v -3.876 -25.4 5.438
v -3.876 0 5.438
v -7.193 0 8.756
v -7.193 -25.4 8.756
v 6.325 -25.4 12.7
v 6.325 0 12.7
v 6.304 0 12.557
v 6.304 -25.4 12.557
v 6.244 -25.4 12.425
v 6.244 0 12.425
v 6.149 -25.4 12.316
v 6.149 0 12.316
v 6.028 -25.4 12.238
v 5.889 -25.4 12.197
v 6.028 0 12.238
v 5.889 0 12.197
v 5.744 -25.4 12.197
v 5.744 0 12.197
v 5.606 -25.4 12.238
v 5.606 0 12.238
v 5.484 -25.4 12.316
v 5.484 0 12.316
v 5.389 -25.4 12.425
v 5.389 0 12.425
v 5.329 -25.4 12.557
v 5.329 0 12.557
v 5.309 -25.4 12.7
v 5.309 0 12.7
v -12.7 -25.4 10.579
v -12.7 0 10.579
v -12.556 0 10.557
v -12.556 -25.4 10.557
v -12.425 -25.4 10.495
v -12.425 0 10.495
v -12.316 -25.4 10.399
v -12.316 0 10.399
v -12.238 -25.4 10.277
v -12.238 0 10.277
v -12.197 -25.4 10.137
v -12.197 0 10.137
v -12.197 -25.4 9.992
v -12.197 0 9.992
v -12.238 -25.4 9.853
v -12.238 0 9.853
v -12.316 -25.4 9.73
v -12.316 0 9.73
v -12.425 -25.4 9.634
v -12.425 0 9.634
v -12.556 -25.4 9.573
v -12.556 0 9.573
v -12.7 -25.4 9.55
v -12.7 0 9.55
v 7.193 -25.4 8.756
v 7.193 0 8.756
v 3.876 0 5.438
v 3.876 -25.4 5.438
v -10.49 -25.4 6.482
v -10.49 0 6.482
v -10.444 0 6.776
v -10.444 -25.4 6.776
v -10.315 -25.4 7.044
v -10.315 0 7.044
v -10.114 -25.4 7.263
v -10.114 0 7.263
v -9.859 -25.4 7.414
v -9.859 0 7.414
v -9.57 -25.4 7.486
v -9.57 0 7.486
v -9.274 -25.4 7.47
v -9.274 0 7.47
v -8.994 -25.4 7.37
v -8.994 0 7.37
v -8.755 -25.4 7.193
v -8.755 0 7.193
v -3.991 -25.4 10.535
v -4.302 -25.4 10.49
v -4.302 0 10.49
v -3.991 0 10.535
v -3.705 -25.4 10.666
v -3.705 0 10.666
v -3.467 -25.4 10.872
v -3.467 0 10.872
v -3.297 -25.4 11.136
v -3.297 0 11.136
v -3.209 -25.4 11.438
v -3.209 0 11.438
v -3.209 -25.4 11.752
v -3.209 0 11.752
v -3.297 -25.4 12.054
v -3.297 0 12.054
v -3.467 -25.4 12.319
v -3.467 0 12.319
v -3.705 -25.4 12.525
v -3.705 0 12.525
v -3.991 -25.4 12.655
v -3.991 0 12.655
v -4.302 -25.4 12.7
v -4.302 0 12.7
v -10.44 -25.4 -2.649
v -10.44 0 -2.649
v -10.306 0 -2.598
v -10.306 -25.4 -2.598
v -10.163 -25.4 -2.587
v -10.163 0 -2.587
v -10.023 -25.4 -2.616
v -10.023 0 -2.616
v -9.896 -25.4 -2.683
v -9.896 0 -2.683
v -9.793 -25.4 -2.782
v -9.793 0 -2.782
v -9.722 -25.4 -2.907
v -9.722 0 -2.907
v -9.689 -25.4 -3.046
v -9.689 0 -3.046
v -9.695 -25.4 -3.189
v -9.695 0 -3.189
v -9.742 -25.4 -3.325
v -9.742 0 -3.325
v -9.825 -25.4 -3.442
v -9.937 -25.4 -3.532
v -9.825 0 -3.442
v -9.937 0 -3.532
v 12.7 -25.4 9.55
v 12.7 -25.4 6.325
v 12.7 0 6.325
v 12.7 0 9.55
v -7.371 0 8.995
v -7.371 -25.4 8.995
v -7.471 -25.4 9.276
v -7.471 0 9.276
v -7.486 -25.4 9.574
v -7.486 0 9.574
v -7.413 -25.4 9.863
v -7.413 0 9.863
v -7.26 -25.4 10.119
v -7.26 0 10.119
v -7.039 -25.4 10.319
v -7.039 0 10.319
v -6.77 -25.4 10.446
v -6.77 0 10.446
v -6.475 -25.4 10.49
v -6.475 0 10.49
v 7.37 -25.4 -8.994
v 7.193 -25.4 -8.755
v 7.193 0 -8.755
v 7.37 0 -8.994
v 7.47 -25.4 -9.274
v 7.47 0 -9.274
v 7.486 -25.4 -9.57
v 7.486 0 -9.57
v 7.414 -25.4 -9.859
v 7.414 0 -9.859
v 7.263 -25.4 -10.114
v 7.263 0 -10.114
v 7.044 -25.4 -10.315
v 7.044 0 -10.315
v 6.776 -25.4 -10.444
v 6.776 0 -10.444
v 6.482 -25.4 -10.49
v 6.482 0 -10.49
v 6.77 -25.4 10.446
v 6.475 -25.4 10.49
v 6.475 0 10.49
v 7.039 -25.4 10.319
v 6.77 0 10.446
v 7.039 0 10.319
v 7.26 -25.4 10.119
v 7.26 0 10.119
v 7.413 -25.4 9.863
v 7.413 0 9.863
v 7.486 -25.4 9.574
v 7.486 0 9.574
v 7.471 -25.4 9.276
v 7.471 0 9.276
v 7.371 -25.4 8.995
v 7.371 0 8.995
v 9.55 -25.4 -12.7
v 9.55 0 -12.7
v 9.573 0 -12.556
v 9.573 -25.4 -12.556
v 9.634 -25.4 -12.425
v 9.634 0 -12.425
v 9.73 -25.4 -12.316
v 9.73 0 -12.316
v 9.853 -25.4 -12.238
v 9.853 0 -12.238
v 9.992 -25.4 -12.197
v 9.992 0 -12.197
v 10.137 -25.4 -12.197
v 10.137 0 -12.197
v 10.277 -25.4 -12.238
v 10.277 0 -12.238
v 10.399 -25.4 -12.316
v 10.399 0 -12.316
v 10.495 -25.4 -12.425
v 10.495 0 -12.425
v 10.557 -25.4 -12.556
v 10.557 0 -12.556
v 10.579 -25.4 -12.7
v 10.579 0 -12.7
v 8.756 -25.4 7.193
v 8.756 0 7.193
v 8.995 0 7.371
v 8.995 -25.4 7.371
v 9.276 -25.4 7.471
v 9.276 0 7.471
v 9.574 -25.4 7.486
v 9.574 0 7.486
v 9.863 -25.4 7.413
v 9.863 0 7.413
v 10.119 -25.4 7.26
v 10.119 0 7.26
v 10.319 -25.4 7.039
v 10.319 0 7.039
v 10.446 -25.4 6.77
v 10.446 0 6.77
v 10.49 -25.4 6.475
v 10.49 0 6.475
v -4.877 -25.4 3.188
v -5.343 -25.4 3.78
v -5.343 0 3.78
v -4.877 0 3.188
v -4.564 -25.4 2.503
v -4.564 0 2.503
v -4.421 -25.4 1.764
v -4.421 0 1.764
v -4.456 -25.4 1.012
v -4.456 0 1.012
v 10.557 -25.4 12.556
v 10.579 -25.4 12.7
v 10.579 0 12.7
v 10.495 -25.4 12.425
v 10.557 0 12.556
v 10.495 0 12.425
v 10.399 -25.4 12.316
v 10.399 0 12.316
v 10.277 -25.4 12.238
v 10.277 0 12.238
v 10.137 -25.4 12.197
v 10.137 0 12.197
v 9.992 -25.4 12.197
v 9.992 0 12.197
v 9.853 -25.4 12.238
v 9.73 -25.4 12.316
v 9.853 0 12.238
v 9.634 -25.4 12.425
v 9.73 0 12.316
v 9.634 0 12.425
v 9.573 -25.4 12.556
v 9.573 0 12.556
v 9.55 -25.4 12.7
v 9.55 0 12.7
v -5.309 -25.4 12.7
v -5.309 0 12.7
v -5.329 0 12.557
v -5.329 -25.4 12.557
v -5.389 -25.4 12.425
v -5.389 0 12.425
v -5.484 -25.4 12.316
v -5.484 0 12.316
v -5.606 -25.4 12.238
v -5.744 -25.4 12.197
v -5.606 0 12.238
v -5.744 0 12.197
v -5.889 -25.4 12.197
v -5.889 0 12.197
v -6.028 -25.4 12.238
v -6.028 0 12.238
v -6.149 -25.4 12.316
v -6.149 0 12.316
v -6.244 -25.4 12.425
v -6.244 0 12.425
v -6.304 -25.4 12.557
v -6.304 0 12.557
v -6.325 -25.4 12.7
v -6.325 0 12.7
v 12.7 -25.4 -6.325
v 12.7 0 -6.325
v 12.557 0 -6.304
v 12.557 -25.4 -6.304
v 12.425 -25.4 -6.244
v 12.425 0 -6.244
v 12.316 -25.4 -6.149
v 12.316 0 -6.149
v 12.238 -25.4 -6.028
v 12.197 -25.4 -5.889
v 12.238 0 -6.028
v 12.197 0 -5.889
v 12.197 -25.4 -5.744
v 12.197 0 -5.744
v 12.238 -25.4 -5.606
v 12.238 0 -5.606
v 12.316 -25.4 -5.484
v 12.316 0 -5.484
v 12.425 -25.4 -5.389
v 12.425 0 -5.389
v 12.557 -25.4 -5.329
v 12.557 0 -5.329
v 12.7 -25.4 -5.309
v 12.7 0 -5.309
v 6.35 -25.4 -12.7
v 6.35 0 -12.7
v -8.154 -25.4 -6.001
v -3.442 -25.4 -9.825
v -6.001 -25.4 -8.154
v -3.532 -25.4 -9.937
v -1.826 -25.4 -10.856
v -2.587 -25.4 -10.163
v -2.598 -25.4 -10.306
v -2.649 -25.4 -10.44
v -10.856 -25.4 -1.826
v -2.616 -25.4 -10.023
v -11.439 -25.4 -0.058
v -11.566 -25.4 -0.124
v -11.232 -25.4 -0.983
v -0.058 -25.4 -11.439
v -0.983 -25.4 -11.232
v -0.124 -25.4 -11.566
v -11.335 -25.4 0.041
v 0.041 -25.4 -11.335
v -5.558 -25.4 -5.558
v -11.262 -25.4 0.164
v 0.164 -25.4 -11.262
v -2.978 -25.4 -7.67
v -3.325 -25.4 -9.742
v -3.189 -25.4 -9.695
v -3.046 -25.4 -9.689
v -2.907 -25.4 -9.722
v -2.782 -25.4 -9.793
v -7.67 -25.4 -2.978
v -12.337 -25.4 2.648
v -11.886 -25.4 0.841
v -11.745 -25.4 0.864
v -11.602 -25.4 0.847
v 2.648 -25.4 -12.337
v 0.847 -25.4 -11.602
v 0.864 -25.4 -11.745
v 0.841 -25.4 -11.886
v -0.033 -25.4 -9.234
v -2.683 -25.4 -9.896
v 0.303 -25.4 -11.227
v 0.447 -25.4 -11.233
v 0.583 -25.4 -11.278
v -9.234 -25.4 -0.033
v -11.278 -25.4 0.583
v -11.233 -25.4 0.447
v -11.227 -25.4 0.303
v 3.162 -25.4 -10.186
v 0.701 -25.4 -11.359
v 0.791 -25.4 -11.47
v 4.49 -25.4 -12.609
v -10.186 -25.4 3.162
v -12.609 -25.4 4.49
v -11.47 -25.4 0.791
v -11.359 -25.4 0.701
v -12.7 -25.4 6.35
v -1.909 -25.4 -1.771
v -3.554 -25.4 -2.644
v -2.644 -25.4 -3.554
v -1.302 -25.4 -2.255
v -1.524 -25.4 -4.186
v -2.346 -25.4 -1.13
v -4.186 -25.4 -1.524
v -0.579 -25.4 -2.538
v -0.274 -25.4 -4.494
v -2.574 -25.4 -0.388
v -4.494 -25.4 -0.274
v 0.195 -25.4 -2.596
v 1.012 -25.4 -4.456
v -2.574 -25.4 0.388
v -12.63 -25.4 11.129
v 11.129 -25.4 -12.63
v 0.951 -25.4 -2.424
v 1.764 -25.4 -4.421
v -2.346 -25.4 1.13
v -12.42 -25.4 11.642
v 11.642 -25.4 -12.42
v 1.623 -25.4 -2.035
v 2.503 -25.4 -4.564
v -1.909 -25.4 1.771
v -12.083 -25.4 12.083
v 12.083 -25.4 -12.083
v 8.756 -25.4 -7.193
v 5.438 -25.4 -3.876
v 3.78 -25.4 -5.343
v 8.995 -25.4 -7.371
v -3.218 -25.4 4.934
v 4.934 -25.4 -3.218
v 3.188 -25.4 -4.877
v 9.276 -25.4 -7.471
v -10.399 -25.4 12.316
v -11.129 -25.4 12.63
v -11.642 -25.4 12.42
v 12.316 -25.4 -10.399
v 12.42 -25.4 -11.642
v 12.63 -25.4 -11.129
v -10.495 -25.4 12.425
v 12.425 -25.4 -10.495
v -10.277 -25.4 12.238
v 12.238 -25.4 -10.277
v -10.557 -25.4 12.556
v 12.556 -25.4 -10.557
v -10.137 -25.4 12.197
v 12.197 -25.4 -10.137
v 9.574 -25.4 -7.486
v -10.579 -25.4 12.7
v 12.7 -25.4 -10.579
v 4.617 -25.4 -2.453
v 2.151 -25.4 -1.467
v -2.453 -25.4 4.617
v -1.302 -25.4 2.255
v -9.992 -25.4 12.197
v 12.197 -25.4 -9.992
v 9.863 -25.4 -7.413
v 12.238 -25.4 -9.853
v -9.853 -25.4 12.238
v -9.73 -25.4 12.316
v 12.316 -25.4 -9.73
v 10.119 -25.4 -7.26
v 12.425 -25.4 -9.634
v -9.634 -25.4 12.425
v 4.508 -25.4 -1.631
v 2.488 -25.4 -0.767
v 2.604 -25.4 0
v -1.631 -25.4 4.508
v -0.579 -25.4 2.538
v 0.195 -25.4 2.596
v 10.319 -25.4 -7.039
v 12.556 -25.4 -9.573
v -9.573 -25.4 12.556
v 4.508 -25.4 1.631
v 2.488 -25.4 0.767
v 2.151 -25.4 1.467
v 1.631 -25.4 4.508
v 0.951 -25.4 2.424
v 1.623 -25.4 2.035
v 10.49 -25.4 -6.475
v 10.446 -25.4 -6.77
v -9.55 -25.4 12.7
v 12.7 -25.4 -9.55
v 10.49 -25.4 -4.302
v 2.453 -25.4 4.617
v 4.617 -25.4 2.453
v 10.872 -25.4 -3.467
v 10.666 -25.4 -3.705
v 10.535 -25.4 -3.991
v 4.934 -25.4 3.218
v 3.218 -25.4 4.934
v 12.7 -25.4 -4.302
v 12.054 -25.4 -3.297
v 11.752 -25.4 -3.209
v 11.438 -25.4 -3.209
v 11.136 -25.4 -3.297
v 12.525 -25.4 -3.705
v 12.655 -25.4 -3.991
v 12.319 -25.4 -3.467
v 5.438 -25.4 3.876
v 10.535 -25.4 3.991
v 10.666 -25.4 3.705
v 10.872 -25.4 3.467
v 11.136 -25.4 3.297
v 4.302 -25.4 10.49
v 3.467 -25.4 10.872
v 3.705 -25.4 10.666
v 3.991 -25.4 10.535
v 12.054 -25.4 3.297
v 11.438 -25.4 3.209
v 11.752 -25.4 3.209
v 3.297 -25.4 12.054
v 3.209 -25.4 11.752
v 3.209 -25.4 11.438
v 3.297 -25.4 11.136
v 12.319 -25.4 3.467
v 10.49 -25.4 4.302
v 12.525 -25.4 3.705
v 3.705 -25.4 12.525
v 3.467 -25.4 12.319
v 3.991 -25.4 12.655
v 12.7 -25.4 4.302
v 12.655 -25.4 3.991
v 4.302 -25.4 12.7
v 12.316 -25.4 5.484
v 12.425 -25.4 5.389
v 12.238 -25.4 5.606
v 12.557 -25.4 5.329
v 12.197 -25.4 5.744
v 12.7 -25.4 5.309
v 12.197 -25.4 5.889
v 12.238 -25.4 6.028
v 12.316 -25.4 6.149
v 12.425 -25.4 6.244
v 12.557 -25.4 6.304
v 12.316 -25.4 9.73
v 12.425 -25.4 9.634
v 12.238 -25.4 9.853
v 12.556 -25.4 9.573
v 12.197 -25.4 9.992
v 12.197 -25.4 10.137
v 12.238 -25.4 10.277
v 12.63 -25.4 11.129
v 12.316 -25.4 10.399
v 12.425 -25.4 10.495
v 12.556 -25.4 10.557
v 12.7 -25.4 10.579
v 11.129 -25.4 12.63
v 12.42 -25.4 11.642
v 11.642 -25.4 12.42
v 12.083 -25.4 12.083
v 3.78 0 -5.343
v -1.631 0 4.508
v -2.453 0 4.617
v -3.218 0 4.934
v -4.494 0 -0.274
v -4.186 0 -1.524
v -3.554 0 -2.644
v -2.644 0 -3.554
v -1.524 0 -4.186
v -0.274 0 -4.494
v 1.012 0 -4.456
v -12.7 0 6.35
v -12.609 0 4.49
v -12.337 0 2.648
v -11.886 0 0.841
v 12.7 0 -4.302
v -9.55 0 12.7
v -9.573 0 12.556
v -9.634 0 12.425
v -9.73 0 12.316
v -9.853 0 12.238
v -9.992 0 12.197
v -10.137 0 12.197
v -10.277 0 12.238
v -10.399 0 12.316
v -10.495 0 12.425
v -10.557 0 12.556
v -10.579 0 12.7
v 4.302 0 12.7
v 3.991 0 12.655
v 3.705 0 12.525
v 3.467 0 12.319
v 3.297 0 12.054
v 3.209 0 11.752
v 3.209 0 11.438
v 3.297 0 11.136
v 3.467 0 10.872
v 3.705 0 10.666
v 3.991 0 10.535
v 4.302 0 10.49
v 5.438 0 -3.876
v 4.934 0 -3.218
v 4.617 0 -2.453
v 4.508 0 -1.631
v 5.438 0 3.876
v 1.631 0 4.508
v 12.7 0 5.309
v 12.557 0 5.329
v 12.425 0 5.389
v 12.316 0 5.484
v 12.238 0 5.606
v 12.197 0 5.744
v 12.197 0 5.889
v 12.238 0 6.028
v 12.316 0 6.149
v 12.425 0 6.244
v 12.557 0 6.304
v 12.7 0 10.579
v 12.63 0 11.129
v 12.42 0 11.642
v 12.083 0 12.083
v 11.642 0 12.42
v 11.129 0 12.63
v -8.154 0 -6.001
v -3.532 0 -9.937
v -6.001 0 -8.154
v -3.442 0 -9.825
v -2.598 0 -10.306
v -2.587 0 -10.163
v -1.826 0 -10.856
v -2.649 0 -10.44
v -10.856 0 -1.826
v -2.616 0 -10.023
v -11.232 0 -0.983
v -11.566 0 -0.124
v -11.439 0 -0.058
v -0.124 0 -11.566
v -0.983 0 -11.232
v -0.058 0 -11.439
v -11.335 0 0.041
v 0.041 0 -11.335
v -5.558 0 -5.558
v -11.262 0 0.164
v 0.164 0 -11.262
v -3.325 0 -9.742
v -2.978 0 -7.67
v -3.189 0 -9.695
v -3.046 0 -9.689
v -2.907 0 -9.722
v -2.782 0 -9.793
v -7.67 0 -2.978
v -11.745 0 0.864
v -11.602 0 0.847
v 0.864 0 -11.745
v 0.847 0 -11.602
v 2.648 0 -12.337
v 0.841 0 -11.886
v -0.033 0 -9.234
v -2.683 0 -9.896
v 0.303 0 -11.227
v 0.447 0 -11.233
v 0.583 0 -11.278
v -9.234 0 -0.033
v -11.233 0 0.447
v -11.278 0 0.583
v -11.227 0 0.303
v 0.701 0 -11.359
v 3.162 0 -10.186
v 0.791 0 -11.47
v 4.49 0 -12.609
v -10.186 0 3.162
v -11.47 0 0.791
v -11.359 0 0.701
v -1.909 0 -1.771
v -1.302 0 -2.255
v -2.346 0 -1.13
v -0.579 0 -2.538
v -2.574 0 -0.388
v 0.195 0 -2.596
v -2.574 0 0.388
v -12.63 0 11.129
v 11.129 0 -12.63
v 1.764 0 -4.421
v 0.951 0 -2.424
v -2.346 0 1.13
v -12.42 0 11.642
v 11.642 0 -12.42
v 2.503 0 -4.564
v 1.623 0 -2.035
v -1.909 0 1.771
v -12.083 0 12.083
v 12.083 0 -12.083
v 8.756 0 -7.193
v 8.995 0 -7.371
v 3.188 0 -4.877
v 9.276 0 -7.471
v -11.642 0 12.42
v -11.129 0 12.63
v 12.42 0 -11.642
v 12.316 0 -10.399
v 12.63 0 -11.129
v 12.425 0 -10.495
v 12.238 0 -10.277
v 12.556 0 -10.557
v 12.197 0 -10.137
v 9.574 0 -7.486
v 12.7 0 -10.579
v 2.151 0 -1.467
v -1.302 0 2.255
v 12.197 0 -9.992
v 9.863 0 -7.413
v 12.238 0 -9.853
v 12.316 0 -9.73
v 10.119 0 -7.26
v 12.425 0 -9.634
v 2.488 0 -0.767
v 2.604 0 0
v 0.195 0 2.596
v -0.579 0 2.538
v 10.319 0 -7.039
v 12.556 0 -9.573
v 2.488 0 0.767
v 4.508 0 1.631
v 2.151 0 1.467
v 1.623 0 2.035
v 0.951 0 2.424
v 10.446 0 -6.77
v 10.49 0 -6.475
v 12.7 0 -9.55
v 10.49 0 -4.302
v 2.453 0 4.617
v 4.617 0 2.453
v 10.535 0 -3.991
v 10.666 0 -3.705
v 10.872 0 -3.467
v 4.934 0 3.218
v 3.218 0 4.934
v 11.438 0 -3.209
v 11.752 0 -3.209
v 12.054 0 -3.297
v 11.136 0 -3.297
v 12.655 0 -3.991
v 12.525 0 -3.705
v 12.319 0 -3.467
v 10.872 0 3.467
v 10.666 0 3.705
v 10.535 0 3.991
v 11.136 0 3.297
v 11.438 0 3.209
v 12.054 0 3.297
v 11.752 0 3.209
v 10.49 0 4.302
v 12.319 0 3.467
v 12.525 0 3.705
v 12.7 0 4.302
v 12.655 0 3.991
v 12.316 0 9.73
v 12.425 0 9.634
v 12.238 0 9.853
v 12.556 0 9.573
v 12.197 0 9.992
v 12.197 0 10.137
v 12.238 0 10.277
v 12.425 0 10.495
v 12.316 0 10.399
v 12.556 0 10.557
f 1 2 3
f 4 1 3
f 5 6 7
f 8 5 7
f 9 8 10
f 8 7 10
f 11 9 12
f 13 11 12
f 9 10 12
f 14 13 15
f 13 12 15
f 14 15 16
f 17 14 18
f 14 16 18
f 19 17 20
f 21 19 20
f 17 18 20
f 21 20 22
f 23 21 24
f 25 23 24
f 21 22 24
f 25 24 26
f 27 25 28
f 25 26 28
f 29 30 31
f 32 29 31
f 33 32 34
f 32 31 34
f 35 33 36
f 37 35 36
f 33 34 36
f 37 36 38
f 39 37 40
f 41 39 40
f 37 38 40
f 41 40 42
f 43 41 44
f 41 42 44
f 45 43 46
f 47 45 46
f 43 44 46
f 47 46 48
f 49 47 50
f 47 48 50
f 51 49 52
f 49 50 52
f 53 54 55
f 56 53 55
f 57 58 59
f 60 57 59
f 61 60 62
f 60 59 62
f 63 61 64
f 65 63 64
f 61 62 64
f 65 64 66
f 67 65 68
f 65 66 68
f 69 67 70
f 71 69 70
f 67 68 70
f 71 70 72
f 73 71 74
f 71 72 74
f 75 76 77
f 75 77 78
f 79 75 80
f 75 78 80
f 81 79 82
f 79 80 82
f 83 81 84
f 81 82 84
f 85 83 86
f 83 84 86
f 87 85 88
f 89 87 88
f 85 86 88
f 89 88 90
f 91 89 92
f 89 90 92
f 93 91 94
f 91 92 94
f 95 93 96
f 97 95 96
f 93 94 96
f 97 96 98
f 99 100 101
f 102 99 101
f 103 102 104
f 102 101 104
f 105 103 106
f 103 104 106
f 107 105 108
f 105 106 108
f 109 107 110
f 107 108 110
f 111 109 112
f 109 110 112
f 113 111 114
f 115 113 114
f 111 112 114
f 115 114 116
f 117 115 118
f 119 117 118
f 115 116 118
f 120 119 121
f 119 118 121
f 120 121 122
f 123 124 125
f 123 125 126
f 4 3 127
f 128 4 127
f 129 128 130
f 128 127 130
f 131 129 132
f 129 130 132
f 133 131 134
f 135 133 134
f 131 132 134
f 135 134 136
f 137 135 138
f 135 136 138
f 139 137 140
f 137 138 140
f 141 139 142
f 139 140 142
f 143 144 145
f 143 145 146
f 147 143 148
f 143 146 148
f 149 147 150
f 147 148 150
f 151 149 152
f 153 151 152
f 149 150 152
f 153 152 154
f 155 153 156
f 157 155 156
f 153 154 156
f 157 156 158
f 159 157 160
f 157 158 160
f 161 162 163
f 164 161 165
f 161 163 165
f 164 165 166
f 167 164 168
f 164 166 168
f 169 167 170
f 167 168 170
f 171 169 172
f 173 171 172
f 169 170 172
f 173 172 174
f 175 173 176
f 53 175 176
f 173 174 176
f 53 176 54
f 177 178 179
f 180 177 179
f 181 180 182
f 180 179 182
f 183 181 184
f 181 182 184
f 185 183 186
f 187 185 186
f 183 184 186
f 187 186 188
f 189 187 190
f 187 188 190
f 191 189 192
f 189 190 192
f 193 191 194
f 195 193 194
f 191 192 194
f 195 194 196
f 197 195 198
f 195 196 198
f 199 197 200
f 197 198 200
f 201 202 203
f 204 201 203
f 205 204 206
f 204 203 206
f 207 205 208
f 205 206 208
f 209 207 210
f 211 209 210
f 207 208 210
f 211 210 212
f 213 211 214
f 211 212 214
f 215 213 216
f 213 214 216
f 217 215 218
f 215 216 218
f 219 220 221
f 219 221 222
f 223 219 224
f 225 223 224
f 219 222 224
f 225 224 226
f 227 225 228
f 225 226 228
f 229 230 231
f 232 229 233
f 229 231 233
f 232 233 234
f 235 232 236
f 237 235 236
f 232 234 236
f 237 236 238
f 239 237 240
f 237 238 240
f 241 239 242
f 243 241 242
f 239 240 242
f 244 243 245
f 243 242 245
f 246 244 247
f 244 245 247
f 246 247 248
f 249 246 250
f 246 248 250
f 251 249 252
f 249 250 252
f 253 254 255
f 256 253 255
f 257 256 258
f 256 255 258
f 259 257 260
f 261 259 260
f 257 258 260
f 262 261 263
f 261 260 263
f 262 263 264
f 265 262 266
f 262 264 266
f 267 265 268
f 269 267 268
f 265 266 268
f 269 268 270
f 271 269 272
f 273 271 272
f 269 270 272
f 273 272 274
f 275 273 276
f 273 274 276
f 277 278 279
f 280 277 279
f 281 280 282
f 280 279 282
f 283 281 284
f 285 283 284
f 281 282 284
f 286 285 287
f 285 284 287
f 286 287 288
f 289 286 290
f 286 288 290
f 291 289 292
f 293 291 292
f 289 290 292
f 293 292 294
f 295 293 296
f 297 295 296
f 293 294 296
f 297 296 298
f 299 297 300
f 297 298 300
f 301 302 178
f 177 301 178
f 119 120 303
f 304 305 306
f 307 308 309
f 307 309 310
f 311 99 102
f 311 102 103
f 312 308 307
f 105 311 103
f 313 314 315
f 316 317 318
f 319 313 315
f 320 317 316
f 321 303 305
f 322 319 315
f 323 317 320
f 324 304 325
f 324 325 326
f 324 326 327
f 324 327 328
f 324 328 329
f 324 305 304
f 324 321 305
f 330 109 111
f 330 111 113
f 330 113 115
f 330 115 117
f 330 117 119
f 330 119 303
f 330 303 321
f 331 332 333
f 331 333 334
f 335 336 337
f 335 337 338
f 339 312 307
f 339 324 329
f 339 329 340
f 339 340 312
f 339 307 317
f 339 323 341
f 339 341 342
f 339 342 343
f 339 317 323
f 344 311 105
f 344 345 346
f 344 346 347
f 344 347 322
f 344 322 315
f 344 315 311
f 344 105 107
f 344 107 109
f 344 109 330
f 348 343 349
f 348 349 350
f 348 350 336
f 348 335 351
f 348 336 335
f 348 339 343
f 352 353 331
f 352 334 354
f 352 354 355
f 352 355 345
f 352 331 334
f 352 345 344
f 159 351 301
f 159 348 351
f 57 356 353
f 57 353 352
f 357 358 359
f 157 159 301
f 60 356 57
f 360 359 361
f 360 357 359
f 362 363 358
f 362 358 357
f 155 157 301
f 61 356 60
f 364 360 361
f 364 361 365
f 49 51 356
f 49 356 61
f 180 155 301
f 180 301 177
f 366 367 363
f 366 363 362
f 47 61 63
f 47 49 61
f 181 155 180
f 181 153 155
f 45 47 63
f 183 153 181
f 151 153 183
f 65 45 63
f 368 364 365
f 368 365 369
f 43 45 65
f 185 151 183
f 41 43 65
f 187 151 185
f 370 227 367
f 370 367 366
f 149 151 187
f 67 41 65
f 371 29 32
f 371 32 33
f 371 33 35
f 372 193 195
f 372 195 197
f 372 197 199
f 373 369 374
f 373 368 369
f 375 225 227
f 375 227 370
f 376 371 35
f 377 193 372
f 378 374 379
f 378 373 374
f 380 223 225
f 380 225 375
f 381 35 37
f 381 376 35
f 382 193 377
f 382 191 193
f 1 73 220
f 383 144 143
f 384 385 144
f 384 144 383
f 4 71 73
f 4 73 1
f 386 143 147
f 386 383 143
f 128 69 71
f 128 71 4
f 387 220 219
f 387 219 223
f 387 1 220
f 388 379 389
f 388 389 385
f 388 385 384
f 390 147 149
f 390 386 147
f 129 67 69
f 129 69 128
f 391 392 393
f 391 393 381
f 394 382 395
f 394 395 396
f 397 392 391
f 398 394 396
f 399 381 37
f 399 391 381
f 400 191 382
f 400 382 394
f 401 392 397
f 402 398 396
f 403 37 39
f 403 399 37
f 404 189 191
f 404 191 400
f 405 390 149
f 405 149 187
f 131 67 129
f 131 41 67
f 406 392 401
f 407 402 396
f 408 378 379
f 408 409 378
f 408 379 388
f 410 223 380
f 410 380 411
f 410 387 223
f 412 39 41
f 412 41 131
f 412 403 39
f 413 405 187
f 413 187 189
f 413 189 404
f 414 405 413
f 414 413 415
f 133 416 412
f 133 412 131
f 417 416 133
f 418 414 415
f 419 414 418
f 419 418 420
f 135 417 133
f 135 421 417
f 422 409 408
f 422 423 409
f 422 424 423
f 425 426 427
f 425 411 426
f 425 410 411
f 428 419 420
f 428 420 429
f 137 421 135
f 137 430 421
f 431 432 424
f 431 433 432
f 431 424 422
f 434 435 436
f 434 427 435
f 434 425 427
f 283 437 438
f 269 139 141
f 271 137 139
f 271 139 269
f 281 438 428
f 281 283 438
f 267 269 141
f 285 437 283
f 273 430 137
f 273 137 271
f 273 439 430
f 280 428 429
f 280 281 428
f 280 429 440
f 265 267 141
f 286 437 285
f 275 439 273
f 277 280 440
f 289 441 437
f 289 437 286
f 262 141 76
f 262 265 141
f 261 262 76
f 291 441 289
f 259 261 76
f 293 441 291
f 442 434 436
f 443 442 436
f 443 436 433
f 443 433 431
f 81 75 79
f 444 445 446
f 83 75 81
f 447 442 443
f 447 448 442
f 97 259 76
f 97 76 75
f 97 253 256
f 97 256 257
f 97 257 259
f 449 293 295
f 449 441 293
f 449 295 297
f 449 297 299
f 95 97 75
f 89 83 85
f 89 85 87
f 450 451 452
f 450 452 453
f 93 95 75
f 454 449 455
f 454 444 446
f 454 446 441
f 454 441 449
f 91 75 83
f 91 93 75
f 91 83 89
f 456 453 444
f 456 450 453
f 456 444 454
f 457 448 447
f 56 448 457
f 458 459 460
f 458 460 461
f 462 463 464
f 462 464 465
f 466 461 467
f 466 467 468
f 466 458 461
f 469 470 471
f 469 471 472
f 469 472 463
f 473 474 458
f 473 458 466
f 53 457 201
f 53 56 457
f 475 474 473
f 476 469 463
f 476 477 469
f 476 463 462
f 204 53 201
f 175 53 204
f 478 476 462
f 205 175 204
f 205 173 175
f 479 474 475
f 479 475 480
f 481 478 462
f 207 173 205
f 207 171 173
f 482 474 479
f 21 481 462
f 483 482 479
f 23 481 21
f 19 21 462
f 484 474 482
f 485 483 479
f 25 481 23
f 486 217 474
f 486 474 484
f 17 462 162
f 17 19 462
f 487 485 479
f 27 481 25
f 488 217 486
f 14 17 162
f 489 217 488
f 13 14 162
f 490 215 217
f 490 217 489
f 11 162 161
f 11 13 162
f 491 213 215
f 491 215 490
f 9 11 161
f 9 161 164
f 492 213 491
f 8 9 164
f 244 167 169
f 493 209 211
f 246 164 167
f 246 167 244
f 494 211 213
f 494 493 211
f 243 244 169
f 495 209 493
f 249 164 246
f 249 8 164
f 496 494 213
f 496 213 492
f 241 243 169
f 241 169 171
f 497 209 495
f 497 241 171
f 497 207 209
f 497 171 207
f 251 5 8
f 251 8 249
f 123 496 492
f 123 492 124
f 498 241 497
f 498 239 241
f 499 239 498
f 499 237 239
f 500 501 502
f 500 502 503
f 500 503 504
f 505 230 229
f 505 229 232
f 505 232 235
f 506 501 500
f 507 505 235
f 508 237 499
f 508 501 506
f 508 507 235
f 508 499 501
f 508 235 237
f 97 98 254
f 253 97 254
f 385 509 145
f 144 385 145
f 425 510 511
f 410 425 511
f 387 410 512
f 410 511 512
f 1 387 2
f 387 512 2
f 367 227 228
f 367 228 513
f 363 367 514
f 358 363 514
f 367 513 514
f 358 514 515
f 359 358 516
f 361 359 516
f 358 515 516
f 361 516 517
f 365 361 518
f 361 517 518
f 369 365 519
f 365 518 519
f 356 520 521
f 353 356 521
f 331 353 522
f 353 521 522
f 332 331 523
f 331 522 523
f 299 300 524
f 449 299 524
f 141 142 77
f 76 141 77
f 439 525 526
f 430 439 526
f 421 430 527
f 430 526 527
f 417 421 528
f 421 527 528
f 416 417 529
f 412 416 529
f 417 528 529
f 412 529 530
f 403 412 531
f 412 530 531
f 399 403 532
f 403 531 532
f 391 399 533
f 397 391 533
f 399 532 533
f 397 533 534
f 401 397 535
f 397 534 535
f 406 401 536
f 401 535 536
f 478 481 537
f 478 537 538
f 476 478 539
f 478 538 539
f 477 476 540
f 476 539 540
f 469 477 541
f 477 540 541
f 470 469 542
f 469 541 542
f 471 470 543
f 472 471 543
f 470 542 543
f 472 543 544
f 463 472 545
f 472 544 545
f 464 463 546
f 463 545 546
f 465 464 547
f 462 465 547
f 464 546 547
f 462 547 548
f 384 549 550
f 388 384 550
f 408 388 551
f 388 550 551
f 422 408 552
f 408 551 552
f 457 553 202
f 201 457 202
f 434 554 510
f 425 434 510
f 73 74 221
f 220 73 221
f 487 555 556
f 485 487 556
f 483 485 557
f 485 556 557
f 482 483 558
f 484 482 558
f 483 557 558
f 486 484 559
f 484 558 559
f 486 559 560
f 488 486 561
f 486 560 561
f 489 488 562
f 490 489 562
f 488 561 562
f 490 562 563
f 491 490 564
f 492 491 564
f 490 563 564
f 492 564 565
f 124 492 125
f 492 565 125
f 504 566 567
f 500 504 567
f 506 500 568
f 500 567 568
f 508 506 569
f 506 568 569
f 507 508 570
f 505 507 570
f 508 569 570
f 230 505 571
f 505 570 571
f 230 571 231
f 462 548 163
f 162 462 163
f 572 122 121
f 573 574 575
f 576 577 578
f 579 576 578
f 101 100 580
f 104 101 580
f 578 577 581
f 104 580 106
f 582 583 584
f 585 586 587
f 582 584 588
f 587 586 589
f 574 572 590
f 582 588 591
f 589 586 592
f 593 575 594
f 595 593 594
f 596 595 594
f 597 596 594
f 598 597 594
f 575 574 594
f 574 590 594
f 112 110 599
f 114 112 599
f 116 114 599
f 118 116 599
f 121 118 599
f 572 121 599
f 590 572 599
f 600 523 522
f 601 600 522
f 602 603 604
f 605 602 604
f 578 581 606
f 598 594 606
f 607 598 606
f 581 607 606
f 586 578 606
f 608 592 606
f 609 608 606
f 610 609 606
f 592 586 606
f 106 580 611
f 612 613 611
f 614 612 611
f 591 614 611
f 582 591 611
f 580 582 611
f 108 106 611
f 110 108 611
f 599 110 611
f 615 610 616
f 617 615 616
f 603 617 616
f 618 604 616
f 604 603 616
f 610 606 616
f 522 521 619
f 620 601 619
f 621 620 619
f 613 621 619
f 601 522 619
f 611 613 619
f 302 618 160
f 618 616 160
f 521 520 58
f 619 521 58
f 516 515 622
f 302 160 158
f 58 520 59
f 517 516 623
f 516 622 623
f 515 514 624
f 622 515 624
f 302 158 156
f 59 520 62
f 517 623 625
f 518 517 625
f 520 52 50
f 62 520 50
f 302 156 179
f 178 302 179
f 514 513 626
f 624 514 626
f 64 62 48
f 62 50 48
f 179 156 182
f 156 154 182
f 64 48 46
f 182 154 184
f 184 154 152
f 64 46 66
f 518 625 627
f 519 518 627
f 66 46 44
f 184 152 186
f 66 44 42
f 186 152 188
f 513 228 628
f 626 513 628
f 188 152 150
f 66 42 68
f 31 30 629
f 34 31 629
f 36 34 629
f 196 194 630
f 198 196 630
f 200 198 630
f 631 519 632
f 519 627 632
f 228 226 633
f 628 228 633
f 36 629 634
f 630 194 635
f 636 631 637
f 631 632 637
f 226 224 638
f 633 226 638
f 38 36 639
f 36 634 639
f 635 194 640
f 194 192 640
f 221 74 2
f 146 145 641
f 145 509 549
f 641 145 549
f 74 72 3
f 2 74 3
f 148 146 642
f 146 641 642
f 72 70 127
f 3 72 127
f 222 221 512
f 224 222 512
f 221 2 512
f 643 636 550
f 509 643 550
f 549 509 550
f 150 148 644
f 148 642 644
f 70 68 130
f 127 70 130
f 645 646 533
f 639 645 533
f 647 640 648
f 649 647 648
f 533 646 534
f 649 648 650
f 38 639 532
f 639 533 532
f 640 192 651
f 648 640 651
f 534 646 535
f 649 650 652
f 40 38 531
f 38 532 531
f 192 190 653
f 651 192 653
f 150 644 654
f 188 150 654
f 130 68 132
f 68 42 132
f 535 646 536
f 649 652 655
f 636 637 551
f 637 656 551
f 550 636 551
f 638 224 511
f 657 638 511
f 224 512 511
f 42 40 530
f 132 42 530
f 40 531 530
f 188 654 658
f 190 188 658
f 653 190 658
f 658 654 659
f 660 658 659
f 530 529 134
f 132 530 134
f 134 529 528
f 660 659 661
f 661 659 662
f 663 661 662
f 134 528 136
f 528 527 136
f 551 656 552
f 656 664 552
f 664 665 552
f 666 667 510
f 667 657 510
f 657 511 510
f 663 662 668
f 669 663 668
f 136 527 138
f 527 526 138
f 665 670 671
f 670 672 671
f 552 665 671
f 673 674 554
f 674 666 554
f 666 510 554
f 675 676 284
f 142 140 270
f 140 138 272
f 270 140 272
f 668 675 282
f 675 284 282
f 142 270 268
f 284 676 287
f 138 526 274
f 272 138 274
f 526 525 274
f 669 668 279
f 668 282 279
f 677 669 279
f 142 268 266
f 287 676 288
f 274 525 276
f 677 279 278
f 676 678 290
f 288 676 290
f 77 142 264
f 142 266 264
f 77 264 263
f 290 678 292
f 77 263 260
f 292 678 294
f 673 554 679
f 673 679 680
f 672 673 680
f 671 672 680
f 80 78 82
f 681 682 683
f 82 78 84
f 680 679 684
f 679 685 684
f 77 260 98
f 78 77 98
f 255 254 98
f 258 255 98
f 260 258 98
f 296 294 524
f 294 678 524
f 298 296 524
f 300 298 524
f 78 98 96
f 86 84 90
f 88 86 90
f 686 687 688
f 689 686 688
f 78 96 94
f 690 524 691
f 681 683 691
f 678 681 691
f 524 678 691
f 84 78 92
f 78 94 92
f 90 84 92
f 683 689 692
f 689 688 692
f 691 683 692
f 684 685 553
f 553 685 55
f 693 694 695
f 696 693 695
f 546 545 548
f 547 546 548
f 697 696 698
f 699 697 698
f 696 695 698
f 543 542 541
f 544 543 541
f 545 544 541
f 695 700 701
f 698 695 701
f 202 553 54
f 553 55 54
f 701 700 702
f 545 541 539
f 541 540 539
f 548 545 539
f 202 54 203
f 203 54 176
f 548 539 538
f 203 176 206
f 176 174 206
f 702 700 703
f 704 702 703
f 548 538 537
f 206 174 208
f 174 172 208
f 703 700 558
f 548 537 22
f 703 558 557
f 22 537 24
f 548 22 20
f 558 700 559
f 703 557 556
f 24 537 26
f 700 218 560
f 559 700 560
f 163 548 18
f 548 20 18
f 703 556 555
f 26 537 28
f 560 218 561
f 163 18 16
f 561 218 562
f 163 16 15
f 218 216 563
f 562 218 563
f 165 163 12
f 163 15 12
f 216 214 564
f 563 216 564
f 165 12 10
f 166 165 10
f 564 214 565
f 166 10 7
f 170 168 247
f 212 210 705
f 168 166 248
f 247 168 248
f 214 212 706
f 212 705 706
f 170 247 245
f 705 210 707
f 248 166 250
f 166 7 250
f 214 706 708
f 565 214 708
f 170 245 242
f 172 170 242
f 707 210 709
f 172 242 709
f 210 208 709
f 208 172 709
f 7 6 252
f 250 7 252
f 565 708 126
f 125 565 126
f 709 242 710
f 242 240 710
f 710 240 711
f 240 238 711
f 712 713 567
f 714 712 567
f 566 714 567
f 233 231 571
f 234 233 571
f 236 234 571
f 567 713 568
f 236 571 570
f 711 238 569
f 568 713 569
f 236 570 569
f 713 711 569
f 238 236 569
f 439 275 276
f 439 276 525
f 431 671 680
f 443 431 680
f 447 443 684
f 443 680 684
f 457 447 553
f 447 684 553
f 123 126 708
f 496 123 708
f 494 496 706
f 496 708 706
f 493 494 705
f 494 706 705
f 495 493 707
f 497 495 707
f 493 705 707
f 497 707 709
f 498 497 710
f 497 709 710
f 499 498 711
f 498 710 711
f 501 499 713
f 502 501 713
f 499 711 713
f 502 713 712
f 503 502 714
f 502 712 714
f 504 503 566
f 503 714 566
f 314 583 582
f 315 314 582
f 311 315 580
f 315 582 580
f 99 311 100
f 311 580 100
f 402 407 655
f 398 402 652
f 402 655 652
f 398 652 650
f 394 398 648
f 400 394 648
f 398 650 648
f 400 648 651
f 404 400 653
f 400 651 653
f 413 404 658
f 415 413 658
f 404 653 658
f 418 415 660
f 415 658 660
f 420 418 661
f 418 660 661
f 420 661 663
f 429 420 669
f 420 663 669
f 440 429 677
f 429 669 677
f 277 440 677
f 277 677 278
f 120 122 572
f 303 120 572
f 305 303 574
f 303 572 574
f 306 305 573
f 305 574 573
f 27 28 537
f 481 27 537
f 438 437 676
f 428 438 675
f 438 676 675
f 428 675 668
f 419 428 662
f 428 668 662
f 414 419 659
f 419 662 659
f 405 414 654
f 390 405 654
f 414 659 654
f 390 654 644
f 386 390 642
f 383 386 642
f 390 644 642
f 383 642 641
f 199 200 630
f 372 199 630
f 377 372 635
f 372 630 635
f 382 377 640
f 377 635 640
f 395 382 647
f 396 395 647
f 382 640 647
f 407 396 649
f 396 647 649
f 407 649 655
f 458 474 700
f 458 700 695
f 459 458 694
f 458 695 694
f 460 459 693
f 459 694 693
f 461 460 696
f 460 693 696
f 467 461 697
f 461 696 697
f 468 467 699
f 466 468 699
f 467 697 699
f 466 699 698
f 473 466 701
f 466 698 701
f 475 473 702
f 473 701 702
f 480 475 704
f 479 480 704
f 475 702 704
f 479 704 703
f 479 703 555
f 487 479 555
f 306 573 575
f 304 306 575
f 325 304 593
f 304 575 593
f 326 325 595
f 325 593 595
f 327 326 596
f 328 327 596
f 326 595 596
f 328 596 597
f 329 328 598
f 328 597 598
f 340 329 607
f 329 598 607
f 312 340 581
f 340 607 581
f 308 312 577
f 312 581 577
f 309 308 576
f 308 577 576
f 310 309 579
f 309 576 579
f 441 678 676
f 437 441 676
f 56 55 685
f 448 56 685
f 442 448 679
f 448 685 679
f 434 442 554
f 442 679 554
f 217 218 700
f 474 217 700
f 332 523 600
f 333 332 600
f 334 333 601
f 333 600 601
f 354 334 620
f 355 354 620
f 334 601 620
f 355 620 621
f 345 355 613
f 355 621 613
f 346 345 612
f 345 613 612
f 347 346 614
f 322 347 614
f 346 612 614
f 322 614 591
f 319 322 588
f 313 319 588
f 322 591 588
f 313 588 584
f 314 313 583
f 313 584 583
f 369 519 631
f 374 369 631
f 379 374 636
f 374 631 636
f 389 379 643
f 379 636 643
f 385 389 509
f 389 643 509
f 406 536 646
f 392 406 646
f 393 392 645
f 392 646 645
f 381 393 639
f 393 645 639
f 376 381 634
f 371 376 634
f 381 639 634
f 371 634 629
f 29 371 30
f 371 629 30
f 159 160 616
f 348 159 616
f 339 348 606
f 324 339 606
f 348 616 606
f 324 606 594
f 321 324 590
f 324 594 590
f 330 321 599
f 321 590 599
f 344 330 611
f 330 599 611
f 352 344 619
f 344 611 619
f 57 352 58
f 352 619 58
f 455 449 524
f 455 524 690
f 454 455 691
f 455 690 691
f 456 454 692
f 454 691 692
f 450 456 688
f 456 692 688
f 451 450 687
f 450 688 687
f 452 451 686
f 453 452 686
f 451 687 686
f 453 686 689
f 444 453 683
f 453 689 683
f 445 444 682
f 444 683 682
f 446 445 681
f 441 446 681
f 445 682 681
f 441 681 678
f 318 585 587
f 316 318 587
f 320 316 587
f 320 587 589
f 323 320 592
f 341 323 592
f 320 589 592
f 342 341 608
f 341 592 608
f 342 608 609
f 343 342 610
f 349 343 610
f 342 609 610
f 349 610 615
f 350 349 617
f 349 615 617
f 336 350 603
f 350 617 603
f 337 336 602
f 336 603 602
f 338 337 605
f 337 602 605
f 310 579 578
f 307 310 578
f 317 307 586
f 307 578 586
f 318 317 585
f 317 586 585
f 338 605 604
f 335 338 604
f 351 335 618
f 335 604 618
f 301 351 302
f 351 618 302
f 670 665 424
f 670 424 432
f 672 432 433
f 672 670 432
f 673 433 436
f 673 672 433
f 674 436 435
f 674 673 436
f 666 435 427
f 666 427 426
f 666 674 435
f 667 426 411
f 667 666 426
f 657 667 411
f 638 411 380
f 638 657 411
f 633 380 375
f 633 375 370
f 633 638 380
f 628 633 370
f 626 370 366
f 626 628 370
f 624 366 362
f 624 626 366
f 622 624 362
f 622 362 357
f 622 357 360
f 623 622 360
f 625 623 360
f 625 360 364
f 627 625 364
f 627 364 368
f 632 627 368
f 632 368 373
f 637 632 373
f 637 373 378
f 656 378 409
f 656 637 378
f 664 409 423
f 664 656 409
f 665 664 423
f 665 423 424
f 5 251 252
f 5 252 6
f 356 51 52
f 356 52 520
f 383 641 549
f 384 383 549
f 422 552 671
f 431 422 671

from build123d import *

# Parameters (mm, degrees)
F0_R     = 2.6035
F1_DEPTH = 25.4


# Not quite as in the source:
# - ends of sketch curves that miss each other by under 0.0002 mm in the source are joined


with BuildPart() as f1:
    # F0 (on Front) → F1 (new body)
    with BuildSketch(Plane.XZ):
        with BuildLine():
            ThreePointArc((-12.6999998568, 10.5791116031), (-12.1919492, 10.06475), (-12.6999998568, 9.5503883969))
            Line((-12.6999998568, 9.5503883969), (-12.7, 6.35))
            ThreePointArc((-12.7, 6.35), (-12.4953913266, 3.565448735), (-11.8859605514, 0.8407130437))
            ThreePointArc((-11.8859605514, 0.8407130437), (-11.2503853868, 0.5162584682), (-11.5663491172, -0.1235908641))
            ThreePointArc((-11.5663491172, -0.1235908641), (-11.0492007439, -1.4069525893), (-10.4402782322, -2.6493920286))
            ThreePointArc((-10.4402782322, -2.6493920286), (-9.7531608674, -2.84205605), (-9.9366469283, -3.5316852695))
            ThreePointArc((-9.9366469283, -3.5316852695), (-7.1203841816, -7.1203841816), (-3.5316659689, -9.9366564303))
            ThreePointArc((-3.5316659689, -9.9366564303), (-2.84205605, -9.7531608674), (-2.6494036278, -10.4402857754))
            ThreePointArc((-2.6494036278, -10.4402857754), (-1.4069525893, -11.0492007439), (-0.1235924101, -11.5663361575))
            ThreePointArc((-0.1235924101, -11.5663361575), (0.5162584682, -11.2503853868), (0.8407328825, -11.8859611899))
            ThreePointArc((0.8407328825, -11.8859611899), (3.565448735, -12.4953913266), (6.35, -12.7))
            Line((6.35, -12.7), (9.5504, -12.7))
            ThreePointArc((9.5504, -12.7), (10.06475, -12.1919492), (10.5791116031, -12.6999998568))
            ThreePointArc((10.5791116031, -12.6999998568), (12.0825733161, -12.0825733161), (12.7000122396, -10.579099926))
            ThreePointArc((12.7000122396, -10.579099926), (12.1919492, -10.06475), (12.6999998568, -9.5503883969))
            Line((12.6999998568, -9.5503883969), (12.7, -6.3246))
            ThreePointArc((12.7, -6.3246), (12.192, -5.8166), (12.7, -5.3086))
            Line((12.7, -5.3086), (12.7, -4.3023028))
            ThreePointArc((12.7, -4.3023028), (11.5951, -3.1974028), (10.4902, -4.3023028))
            Line((10.4902, -4.3023028), (10.4902, -6.4747902))
            ThreePointArc((10.4902, -6.4747902), (9.8630063673, -7.413451805), (8.7557795103, -7.1932106897))
            Line((8.7557795103, -7.1932106897), (5.4384448, -3.8758622))
            ThreePointArc((5.4384448, -3.8758622), (4.7501824843, -2.8458268978), (4.5085, -1.630807))
            Line((4.5085, -1.630807), (4.5085, 1.630807))
            ThreePointArc((4.5085, 1.630807), (4.7501824843, 2.8458268978), (5.4384359697, 3.8758710303))
            Line((5.4384359697, 3.8758710303), (8.7557864, 7.1932038))
            ThreePointArc((8.7557864, 7.1932038), (9.8630063673, 7.413451805), (10.4902, 6.4747902))
            Line((10.4902, 6.4747902), (10.4902, 4.3023028))
            ThreePointArc((10.4902, 4.3023028), (11.5951, 3.1974028), (12.7, 4.3023028))
            Line((12.7, 4.3023028), (12.7, 5.3086))
            ThreePointArc((12.7, 5.3086), (12.192, 5.8166), (12.7, 6.3246))
            Line((12.7, 6.3246), (12.7, 9.5504))
            ThreePointArc((12.7, 9.5504), (12.1919492, 10.06475), (12.6999998568, 10.5791116031))
            ThreePointArc((12.6999998568, 10.5791116031), (12.0825733161, 12.0825733161), (10.579099926, 12.7000122396))
            ThreePointArc((10.579099926, 12.7000122396), (10.06475, 12.1919492), (9.5503883969, 12.6999998568))
            Line((9.5503883969, 12.6999998568), (6.3246, 12.7))
            ThreePointArc((6.3246, 12.7), (5.8166, 12.192), (5.3086, 12.7))
            Line((5.3086, 12.7), (4.3023028, 12.7))
            ThreePointArc((4.3023028, 12.7), (3.1974028, 11.5951), (4.3023028, 10.4902))
            Line((4.3023028, 10.4902), (6.4747902, 10.4902))
            ThreePointArc((6.4747902, 10.4902), (7.413451805, 9.8630063673), (7.1932106897, 8.7557795103))
            Line((7.1932106897, 8.7557795103), (3.8758622, 5.4384448))
            ThreePointArc((3.8758622, 5.4384448), (2.8458268978, 4.7501824843), (1.630807, 4.5085))
            Line((1.630807, 4.5085), (-1.630807, 4.5085))
            ThreePointArc((-1.630807, 4.5085), (-2.8458268978, 4.7501824843), (-3.8758710303, 5.4384359697))
            Line((-3.8758710303, 5.4384359697), (-7.1932038, 8.7557864))
            ThreePointArc((-7.1932038, 8.7557864), (-7.413451805, 9.8630063673), (-6.4747902, 10.4902))
            Line((-6.4747902, 10.4902), (-4.3023028, 10.4902))
            ThreePointArc((-4.3023028, 10.4902), (-3.1974028, 11.5951), (-4.3023028, 12.7))
            Line((-4.3023028, 12.7), (-5.3086, 12.7))
            ThreePointArc((-5.3086, 12.7), (-5.8166, 12.192), (-6.3246, 12.7))
            Line((-6.3246, 12.7), (-9.5504, 12.7))
            ThreePointArc((-9.5504, 12.7), (-10.06475, 12.1919492), (-10.5791116031, 12.6999998568))
            ThreePointArc((-10.5791116031, 12.6999998568), (-12.0825733161, 12.0825733161), (-12.6999998568, 10.5791116031))
        make_face()
        with BuildLine():
            ThreePointArc((-10.4896860957, 6.4822831536), (-9.8588365186, 7.4144880425), (-8.7552969103, 7.1927280897))
            Line((-8.7552969103, 7.1927280897), (-5.3427122, 3.7801296))
            ThreePointArc((-5.3427122, 3.7801296), (-4.5640049581, 2.5033128493), (-4.4562086701, 1.0116578151))
            ThreePointArc((-4.4562086701, 1.0116578151), (-3.1300157893, -3.1300157893), (1.0116576108, -4.4562074473))
            ThreePointArc((1.0116576108, -4.4562074473), (2.5033128493, -4.5640049581), (3.7801384303, -5.3427033697))
            Line((3.7801384303, -5.3427033697), (7.1927212, -8.7553038))
            ThreePointArc((7.1927212, -8.7553038), (7.4144880425, -9.8588365186), (6.4822831536, -10.4896860957))
            ThreePointArc((6.4822831536, -10.4896860957), (-5.5578196165, -5.5578196165), (-10.4896860957, 6.4822831536))
        make_face(mode=Mode.SUBTRACT)
        Circle(F0_R, mode=Mode.SUBTRACT)
    extrude(amount=F1_DEPTH)


solid = f1.part
